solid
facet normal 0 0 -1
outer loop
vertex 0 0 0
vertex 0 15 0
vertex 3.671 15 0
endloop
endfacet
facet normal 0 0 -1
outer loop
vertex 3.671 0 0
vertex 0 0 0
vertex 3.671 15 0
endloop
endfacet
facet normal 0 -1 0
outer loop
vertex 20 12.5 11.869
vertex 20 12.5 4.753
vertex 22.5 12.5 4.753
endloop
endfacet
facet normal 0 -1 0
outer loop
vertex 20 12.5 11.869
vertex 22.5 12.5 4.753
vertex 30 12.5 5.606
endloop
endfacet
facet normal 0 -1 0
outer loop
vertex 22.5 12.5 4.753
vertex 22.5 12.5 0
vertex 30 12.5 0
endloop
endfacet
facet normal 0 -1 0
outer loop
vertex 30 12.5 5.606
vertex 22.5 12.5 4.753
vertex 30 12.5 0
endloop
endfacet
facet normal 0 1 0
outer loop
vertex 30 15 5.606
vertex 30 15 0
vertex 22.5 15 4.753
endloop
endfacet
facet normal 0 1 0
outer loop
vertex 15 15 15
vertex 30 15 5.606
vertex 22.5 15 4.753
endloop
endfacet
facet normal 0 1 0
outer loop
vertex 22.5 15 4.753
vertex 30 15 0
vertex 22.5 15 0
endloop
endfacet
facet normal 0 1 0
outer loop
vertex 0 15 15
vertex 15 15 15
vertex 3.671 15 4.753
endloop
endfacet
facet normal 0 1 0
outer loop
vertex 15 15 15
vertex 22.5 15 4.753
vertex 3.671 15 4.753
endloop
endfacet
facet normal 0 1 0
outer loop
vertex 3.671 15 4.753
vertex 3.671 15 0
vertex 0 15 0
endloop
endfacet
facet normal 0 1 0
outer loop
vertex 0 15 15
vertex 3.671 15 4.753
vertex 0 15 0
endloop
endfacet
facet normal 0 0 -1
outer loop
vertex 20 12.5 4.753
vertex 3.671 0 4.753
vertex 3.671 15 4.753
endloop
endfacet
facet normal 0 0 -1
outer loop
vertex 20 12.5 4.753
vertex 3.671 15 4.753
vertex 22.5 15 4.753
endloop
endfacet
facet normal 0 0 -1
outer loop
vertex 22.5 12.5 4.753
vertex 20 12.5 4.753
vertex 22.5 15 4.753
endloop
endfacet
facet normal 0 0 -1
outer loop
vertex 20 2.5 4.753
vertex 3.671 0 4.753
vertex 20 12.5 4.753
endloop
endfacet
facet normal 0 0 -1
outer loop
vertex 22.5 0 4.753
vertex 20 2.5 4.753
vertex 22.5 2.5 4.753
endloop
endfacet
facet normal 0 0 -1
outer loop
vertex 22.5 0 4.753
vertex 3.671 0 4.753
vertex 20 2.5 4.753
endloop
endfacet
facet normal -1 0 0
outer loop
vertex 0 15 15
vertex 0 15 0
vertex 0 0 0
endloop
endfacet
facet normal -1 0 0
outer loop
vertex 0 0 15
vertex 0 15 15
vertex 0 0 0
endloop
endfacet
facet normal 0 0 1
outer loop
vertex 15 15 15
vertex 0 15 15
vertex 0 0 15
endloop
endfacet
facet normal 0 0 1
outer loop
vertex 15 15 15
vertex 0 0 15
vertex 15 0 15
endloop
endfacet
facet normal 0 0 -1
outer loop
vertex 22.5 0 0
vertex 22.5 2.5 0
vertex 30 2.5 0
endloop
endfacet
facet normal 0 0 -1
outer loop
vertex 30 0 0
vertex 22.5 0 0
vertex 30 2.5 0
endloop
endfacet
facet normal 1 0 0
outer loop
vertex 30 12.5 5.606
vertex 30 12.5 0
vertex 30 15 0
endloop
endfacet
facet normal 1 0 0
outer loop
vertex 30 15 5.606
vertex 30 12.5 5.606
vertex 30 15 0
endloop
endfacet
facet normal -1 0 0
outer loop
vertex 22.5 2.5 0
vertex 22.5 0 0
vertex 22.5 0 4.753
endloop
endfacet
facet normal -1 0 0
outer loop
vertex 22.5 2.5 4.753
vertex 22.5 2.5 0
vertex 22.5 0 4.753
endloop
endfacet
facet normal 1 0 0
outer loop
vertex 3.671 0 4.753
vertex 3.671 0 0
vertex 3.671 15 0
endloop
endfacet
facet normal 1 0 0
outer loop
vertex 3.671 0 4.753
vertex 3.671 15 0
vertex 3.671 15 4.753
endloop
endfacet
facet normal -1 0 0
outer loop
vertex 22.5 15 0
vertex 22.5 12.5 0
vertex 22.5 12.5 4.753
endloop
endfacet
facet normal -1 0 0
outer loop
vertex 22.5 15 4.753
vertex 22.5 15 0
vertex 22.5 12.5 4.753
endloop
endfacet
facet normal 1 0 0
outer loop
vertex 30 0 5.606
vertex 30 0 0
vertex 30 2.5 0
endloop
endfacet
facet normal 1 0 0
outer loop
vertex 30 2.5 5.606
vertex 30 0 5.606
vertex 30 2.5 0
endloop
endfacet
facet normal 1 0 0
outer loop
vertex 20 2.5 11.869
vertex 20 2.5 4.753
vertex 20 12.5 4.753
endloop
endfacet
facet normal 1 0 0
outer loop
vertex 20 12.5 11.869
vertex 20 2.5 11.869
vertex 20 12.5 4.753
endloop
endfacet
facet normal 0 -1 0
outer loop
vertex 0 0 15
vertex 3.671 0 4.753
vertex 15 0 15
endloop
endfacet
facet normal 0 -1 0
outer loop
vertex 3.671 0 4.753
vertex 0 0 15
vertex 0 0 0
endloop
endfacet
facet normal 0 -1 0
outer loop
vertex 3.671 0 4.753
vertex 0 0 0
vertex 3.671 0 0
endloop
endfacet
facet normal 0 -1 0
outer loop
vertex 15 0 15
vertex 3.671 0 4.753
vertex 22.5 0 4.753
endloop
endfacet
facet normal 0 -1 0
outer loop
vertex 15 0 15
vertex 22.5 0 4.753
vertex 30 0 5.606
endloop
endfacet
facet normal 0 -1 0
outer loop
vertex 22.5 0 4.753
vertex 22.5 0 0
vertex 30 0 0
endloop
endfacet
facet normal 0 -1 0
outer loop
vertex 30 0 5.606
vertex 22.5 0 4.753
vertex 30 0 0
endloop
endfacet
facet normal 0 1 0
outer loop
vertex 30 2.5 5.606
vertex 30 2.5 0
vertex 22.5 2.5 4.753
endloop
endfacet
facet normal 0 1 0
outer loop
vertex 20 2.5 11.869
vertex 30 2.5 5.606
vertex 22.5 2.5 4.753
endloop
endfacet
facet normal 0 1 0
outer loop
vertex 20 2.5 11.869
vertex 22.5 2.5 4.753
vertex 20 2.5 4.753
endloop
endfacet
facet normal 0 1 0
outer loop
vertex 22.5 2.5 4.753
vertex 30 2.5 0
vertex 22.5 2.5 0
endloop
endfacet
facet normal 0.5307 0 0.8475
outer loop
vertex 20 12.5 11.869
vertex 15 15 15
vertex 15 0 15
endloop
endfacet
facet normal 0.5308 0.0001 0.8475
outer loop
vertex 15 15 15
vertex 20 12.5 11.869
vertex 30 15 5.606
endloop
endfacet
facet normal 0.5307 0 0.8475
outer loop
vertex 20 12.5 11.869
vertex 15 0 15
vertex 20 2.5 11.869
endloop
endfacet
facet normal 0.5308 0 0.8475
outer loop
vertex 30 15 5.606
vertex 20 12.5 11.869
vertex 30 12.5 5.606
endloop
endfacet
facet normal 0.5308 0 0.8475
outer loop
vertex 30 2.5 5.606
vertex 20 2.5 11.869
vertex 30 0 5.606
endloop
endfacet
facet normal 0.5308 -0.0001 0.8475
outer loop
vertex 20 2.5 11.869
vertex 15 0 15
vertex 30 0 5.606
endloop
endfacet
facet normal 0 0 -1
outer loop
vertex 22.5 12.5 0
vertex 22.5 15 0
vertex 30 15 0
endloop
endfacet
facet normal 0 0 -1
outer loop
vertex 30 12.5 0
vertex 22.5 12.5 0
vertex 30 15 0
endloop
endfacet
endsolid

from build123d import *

# Parameters (mm, degrees)
F1_DEPTH = 15
F3_DEPTH = 15.001
F2_W     = 18.829098
F2_H     = 4.753366
F4_DEPTH = 15.001


with BuildPart() as f1:
    # F0 (on Top) → F1 (new body)
    with BuildSketch(Plane.XY):
        Polygon((0, 15), (0, 0), (30, 0), (30, 2.5), (20, 2.5), (20, 12.5), (30, 12.5), (30, 15), align=None)
    extrude(amount=F1_DEPTH)

    # F2 (on face) → F3 (cut, through all)
    with BuildSketch(Plane.XZ):
        Polygon((30, 15), (15, 15), (30, 5.606282), align=None)
    extrude(amount=-F3_DEPTH, mode=Mode.SUBTRACT)

    # F2 (on face) → F4 (cut, through all)
    with BuildSketch(Plane.XZ):
        with Locations((13.085451, 2.376683)):
            Rectangle(F2_W, F2_H)
    extrude(amount=-F4_DEPTH, mode=Mode.SUBTRACT)


solid = f1.part
